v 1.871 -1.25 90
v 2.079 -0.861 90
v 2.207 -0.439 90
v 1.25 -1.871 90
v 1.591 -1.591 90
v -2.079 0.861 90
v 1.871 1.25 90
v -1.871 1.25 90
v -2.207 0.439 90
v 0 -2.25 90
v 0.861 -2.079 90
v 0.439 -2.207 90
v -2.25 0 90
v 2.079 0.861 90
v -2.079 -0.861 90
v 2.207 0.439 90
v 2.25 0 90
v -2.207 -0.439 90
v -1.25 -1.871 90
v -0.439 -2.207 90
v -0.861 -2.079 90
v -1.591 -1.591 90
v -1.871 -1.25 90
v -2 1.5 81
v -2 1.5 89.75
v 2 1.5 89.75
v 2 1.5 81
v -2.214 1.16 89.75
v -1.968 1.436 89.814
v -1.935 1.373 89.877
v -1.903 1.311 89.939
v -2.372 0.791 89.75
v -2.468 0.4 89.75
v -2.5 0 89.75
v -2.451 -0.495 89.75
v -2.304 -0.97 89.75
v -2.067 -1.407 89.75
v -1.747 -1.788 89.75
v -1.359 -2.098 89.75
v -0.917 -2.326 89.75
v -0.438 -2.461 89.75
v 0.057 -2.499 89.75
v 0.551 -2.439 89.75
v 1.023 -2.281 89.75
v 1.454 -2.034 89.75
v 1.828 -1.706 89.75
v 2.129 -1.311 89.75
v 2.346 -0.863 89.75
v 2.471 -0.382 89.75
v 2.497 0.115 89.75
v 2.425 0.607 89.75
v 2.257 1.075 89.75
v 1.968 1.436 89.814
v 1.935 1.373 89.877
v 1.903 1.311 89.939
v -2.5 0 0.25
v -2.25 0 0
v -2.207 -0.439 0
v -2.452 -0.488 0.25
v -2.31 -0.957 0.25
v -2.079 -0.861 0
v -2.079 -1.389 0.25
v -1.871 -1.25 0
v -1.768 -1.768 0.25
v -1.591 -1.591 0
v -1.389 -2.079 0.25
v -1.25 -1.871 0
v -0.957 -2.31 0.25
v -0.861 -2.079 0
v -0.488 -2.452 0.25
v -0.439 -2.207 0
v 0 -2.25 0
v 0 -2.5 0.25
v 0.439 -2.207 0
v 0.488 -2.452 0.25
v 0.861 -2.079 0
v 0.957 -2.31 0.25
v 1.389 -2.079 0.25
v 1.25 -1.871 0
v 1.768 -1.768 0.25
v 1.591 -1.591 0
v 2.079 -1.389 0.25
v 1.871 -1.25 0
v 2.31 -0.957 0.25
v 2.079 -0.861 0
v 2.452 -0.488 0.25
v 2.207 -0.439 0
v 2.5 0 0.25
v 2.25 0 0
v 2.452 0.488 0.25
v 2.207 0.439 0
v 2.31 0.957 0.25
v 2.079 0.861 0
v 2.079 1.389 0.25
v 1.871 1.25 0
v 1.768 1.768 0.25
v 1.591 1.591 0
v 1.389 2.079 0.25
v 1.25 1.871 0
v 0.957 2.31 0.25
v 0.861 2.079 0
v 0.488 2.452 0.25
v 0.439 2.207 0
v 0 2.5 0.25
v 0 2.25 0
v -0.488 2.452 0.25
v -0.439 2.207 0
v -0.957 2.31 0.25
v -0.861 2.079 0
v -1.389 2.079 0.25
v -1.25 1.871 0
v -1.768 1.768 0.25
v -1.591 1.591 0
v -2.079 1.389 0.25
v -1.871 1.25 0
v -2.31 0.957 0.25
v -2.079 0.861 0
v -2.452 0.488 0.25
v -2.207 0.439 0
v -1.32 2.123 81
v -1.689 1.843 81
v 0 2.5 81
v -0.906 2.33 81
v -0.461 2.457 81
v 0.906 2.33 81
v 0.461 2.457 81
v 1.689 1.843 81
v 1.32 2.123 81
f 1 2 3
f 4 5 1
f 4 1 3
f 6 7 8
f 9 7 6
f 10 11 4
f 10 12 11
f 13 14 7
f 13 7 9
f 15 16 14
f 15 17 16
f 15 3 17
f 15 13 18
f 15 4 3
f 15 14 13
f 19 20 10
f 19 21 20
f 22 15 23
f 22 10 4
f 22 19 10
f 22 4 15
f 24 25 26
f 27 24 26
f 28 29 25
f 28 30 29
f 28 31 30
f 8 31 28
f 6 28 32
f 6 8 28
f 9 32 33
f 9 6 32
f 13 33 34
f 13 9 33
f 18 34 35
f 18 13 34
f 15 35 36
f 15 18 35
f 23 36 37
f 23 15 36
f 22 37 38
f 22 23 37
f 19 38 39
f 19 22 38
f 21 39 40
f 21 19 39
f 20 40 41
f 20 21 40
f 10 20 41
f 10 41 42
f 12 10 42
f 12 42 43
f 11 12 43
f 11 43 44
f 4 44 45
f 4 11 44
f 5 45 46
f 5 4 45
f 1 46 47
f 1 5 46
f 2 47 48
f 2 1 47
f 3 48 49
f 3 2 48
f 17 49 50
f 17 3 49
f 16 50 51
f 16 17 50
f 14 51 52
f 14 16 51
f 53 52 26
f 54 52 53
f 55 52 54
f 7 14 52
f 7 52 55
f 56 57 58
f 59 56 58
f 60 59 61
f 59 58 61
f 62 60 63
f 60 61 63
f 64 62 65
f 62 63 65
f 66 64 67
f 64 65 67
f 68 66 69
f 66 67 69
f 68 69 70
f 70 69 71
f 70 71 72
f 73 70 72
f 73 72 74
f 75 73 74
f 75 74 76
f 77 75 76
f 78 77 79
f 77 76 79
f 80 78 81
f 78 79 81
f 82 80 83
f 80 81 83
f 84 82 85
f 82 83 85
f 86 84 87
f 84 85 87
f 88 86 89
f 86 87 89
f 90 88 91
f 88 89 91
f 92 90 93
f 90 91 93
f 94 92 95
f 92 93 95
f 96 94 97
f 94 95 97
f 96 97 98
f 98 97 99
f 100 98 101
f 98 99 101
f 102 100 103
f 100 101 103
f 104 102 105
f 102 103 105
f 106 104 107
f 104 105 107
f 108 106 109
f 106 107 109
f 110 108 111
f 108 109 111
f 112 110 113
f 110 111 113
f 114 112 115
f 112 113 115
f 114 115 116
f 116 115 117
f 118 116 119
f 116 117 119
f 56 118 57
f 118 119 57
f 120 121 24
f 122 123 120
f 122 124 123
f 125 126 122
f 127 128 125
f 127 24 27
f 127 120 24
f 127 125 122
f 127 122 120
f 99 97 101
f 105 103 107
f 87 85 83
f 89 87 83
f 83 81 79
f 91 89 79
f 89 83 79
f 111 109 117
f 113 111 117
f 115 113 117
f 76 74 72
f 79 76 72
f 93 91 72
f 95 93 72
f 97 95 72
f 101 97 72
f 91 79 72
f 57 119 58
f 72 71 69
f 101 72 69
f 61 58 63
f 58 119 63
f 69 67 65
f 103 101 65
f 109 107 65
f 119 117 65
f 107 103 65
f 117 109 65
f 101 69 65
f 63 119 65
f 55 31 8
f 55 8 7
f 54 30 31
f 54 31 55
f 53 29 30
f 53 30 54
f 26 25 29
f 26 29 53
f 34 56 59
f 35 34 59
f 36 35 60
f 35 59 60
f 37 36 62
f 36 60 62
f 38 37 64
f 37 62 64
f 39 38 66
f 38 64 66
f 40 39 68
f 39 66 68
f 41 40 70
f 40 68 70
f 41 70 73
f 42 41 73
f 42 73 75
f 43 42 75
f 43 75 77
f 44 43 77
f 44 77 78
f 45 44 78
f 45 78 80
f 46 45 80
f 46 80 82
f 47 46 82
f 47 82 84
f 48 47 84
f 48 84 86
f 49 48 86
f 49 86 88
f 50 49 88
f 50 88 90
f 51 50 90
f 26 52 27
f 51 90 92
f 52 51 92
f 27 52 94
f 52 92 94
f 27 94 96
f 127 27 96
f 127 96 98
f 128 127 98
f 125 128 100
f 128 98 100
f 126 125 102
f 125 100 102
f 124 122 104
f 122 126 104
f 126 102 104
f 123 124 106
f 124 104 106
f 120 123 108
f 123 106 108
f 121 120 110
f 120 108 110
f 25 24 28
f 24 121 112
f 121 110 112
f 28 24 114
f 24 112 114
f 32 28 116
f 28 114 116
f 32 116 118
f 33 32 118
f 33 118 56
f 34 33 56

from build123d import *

# Parameters (mm, degrees)
SKETCH1_R           = 2.5
BOSS_EXTRUDE1_DEPTH = 90
CUT_EXTRUDE1_DEPTH  = 9
CHAMFER1_SIZE       = 0.25


with BuildPart() as part:
    # Sketch1 → Boss-Extrude1 (new body)
    with BuildSketch(Plane.XY):
        with Locations(Location((0, 0, 0), (0, 0, 180))):
            Circle(SKETCH1_R)
    extrude(amount=BOSS_EXTRUDE1_DEPTH)

    # Sketch2 → Cut-Extrude1 (cut)
    with BuildSketch(Plane.XY.offset(90)):
        with BuildLine():
            Line((-2.454110015, 1.5), (2.151792115, 1.5))
            ThreePointArc((2.151792115, 1.5), (-0.15115895, 4.391411645), (-2.454110015, 1.5))
        make_face()
    extrude(amount=-CUT_EXTRUDE1_DEPTH, mode=Mode.SUBTRACT)

    # Chamfer1
    chamfer1_edges = [part.edges().sort_by_distance(p)[0] for p in [
        (2.5, 0, 0),
        (0.790569415, -2.371708245, 90),
        (0, 1.5, 90),
    ]]
    chamfer(chamfer1_edges, length=CHAMFER1_SIZE)


solid = part.part
